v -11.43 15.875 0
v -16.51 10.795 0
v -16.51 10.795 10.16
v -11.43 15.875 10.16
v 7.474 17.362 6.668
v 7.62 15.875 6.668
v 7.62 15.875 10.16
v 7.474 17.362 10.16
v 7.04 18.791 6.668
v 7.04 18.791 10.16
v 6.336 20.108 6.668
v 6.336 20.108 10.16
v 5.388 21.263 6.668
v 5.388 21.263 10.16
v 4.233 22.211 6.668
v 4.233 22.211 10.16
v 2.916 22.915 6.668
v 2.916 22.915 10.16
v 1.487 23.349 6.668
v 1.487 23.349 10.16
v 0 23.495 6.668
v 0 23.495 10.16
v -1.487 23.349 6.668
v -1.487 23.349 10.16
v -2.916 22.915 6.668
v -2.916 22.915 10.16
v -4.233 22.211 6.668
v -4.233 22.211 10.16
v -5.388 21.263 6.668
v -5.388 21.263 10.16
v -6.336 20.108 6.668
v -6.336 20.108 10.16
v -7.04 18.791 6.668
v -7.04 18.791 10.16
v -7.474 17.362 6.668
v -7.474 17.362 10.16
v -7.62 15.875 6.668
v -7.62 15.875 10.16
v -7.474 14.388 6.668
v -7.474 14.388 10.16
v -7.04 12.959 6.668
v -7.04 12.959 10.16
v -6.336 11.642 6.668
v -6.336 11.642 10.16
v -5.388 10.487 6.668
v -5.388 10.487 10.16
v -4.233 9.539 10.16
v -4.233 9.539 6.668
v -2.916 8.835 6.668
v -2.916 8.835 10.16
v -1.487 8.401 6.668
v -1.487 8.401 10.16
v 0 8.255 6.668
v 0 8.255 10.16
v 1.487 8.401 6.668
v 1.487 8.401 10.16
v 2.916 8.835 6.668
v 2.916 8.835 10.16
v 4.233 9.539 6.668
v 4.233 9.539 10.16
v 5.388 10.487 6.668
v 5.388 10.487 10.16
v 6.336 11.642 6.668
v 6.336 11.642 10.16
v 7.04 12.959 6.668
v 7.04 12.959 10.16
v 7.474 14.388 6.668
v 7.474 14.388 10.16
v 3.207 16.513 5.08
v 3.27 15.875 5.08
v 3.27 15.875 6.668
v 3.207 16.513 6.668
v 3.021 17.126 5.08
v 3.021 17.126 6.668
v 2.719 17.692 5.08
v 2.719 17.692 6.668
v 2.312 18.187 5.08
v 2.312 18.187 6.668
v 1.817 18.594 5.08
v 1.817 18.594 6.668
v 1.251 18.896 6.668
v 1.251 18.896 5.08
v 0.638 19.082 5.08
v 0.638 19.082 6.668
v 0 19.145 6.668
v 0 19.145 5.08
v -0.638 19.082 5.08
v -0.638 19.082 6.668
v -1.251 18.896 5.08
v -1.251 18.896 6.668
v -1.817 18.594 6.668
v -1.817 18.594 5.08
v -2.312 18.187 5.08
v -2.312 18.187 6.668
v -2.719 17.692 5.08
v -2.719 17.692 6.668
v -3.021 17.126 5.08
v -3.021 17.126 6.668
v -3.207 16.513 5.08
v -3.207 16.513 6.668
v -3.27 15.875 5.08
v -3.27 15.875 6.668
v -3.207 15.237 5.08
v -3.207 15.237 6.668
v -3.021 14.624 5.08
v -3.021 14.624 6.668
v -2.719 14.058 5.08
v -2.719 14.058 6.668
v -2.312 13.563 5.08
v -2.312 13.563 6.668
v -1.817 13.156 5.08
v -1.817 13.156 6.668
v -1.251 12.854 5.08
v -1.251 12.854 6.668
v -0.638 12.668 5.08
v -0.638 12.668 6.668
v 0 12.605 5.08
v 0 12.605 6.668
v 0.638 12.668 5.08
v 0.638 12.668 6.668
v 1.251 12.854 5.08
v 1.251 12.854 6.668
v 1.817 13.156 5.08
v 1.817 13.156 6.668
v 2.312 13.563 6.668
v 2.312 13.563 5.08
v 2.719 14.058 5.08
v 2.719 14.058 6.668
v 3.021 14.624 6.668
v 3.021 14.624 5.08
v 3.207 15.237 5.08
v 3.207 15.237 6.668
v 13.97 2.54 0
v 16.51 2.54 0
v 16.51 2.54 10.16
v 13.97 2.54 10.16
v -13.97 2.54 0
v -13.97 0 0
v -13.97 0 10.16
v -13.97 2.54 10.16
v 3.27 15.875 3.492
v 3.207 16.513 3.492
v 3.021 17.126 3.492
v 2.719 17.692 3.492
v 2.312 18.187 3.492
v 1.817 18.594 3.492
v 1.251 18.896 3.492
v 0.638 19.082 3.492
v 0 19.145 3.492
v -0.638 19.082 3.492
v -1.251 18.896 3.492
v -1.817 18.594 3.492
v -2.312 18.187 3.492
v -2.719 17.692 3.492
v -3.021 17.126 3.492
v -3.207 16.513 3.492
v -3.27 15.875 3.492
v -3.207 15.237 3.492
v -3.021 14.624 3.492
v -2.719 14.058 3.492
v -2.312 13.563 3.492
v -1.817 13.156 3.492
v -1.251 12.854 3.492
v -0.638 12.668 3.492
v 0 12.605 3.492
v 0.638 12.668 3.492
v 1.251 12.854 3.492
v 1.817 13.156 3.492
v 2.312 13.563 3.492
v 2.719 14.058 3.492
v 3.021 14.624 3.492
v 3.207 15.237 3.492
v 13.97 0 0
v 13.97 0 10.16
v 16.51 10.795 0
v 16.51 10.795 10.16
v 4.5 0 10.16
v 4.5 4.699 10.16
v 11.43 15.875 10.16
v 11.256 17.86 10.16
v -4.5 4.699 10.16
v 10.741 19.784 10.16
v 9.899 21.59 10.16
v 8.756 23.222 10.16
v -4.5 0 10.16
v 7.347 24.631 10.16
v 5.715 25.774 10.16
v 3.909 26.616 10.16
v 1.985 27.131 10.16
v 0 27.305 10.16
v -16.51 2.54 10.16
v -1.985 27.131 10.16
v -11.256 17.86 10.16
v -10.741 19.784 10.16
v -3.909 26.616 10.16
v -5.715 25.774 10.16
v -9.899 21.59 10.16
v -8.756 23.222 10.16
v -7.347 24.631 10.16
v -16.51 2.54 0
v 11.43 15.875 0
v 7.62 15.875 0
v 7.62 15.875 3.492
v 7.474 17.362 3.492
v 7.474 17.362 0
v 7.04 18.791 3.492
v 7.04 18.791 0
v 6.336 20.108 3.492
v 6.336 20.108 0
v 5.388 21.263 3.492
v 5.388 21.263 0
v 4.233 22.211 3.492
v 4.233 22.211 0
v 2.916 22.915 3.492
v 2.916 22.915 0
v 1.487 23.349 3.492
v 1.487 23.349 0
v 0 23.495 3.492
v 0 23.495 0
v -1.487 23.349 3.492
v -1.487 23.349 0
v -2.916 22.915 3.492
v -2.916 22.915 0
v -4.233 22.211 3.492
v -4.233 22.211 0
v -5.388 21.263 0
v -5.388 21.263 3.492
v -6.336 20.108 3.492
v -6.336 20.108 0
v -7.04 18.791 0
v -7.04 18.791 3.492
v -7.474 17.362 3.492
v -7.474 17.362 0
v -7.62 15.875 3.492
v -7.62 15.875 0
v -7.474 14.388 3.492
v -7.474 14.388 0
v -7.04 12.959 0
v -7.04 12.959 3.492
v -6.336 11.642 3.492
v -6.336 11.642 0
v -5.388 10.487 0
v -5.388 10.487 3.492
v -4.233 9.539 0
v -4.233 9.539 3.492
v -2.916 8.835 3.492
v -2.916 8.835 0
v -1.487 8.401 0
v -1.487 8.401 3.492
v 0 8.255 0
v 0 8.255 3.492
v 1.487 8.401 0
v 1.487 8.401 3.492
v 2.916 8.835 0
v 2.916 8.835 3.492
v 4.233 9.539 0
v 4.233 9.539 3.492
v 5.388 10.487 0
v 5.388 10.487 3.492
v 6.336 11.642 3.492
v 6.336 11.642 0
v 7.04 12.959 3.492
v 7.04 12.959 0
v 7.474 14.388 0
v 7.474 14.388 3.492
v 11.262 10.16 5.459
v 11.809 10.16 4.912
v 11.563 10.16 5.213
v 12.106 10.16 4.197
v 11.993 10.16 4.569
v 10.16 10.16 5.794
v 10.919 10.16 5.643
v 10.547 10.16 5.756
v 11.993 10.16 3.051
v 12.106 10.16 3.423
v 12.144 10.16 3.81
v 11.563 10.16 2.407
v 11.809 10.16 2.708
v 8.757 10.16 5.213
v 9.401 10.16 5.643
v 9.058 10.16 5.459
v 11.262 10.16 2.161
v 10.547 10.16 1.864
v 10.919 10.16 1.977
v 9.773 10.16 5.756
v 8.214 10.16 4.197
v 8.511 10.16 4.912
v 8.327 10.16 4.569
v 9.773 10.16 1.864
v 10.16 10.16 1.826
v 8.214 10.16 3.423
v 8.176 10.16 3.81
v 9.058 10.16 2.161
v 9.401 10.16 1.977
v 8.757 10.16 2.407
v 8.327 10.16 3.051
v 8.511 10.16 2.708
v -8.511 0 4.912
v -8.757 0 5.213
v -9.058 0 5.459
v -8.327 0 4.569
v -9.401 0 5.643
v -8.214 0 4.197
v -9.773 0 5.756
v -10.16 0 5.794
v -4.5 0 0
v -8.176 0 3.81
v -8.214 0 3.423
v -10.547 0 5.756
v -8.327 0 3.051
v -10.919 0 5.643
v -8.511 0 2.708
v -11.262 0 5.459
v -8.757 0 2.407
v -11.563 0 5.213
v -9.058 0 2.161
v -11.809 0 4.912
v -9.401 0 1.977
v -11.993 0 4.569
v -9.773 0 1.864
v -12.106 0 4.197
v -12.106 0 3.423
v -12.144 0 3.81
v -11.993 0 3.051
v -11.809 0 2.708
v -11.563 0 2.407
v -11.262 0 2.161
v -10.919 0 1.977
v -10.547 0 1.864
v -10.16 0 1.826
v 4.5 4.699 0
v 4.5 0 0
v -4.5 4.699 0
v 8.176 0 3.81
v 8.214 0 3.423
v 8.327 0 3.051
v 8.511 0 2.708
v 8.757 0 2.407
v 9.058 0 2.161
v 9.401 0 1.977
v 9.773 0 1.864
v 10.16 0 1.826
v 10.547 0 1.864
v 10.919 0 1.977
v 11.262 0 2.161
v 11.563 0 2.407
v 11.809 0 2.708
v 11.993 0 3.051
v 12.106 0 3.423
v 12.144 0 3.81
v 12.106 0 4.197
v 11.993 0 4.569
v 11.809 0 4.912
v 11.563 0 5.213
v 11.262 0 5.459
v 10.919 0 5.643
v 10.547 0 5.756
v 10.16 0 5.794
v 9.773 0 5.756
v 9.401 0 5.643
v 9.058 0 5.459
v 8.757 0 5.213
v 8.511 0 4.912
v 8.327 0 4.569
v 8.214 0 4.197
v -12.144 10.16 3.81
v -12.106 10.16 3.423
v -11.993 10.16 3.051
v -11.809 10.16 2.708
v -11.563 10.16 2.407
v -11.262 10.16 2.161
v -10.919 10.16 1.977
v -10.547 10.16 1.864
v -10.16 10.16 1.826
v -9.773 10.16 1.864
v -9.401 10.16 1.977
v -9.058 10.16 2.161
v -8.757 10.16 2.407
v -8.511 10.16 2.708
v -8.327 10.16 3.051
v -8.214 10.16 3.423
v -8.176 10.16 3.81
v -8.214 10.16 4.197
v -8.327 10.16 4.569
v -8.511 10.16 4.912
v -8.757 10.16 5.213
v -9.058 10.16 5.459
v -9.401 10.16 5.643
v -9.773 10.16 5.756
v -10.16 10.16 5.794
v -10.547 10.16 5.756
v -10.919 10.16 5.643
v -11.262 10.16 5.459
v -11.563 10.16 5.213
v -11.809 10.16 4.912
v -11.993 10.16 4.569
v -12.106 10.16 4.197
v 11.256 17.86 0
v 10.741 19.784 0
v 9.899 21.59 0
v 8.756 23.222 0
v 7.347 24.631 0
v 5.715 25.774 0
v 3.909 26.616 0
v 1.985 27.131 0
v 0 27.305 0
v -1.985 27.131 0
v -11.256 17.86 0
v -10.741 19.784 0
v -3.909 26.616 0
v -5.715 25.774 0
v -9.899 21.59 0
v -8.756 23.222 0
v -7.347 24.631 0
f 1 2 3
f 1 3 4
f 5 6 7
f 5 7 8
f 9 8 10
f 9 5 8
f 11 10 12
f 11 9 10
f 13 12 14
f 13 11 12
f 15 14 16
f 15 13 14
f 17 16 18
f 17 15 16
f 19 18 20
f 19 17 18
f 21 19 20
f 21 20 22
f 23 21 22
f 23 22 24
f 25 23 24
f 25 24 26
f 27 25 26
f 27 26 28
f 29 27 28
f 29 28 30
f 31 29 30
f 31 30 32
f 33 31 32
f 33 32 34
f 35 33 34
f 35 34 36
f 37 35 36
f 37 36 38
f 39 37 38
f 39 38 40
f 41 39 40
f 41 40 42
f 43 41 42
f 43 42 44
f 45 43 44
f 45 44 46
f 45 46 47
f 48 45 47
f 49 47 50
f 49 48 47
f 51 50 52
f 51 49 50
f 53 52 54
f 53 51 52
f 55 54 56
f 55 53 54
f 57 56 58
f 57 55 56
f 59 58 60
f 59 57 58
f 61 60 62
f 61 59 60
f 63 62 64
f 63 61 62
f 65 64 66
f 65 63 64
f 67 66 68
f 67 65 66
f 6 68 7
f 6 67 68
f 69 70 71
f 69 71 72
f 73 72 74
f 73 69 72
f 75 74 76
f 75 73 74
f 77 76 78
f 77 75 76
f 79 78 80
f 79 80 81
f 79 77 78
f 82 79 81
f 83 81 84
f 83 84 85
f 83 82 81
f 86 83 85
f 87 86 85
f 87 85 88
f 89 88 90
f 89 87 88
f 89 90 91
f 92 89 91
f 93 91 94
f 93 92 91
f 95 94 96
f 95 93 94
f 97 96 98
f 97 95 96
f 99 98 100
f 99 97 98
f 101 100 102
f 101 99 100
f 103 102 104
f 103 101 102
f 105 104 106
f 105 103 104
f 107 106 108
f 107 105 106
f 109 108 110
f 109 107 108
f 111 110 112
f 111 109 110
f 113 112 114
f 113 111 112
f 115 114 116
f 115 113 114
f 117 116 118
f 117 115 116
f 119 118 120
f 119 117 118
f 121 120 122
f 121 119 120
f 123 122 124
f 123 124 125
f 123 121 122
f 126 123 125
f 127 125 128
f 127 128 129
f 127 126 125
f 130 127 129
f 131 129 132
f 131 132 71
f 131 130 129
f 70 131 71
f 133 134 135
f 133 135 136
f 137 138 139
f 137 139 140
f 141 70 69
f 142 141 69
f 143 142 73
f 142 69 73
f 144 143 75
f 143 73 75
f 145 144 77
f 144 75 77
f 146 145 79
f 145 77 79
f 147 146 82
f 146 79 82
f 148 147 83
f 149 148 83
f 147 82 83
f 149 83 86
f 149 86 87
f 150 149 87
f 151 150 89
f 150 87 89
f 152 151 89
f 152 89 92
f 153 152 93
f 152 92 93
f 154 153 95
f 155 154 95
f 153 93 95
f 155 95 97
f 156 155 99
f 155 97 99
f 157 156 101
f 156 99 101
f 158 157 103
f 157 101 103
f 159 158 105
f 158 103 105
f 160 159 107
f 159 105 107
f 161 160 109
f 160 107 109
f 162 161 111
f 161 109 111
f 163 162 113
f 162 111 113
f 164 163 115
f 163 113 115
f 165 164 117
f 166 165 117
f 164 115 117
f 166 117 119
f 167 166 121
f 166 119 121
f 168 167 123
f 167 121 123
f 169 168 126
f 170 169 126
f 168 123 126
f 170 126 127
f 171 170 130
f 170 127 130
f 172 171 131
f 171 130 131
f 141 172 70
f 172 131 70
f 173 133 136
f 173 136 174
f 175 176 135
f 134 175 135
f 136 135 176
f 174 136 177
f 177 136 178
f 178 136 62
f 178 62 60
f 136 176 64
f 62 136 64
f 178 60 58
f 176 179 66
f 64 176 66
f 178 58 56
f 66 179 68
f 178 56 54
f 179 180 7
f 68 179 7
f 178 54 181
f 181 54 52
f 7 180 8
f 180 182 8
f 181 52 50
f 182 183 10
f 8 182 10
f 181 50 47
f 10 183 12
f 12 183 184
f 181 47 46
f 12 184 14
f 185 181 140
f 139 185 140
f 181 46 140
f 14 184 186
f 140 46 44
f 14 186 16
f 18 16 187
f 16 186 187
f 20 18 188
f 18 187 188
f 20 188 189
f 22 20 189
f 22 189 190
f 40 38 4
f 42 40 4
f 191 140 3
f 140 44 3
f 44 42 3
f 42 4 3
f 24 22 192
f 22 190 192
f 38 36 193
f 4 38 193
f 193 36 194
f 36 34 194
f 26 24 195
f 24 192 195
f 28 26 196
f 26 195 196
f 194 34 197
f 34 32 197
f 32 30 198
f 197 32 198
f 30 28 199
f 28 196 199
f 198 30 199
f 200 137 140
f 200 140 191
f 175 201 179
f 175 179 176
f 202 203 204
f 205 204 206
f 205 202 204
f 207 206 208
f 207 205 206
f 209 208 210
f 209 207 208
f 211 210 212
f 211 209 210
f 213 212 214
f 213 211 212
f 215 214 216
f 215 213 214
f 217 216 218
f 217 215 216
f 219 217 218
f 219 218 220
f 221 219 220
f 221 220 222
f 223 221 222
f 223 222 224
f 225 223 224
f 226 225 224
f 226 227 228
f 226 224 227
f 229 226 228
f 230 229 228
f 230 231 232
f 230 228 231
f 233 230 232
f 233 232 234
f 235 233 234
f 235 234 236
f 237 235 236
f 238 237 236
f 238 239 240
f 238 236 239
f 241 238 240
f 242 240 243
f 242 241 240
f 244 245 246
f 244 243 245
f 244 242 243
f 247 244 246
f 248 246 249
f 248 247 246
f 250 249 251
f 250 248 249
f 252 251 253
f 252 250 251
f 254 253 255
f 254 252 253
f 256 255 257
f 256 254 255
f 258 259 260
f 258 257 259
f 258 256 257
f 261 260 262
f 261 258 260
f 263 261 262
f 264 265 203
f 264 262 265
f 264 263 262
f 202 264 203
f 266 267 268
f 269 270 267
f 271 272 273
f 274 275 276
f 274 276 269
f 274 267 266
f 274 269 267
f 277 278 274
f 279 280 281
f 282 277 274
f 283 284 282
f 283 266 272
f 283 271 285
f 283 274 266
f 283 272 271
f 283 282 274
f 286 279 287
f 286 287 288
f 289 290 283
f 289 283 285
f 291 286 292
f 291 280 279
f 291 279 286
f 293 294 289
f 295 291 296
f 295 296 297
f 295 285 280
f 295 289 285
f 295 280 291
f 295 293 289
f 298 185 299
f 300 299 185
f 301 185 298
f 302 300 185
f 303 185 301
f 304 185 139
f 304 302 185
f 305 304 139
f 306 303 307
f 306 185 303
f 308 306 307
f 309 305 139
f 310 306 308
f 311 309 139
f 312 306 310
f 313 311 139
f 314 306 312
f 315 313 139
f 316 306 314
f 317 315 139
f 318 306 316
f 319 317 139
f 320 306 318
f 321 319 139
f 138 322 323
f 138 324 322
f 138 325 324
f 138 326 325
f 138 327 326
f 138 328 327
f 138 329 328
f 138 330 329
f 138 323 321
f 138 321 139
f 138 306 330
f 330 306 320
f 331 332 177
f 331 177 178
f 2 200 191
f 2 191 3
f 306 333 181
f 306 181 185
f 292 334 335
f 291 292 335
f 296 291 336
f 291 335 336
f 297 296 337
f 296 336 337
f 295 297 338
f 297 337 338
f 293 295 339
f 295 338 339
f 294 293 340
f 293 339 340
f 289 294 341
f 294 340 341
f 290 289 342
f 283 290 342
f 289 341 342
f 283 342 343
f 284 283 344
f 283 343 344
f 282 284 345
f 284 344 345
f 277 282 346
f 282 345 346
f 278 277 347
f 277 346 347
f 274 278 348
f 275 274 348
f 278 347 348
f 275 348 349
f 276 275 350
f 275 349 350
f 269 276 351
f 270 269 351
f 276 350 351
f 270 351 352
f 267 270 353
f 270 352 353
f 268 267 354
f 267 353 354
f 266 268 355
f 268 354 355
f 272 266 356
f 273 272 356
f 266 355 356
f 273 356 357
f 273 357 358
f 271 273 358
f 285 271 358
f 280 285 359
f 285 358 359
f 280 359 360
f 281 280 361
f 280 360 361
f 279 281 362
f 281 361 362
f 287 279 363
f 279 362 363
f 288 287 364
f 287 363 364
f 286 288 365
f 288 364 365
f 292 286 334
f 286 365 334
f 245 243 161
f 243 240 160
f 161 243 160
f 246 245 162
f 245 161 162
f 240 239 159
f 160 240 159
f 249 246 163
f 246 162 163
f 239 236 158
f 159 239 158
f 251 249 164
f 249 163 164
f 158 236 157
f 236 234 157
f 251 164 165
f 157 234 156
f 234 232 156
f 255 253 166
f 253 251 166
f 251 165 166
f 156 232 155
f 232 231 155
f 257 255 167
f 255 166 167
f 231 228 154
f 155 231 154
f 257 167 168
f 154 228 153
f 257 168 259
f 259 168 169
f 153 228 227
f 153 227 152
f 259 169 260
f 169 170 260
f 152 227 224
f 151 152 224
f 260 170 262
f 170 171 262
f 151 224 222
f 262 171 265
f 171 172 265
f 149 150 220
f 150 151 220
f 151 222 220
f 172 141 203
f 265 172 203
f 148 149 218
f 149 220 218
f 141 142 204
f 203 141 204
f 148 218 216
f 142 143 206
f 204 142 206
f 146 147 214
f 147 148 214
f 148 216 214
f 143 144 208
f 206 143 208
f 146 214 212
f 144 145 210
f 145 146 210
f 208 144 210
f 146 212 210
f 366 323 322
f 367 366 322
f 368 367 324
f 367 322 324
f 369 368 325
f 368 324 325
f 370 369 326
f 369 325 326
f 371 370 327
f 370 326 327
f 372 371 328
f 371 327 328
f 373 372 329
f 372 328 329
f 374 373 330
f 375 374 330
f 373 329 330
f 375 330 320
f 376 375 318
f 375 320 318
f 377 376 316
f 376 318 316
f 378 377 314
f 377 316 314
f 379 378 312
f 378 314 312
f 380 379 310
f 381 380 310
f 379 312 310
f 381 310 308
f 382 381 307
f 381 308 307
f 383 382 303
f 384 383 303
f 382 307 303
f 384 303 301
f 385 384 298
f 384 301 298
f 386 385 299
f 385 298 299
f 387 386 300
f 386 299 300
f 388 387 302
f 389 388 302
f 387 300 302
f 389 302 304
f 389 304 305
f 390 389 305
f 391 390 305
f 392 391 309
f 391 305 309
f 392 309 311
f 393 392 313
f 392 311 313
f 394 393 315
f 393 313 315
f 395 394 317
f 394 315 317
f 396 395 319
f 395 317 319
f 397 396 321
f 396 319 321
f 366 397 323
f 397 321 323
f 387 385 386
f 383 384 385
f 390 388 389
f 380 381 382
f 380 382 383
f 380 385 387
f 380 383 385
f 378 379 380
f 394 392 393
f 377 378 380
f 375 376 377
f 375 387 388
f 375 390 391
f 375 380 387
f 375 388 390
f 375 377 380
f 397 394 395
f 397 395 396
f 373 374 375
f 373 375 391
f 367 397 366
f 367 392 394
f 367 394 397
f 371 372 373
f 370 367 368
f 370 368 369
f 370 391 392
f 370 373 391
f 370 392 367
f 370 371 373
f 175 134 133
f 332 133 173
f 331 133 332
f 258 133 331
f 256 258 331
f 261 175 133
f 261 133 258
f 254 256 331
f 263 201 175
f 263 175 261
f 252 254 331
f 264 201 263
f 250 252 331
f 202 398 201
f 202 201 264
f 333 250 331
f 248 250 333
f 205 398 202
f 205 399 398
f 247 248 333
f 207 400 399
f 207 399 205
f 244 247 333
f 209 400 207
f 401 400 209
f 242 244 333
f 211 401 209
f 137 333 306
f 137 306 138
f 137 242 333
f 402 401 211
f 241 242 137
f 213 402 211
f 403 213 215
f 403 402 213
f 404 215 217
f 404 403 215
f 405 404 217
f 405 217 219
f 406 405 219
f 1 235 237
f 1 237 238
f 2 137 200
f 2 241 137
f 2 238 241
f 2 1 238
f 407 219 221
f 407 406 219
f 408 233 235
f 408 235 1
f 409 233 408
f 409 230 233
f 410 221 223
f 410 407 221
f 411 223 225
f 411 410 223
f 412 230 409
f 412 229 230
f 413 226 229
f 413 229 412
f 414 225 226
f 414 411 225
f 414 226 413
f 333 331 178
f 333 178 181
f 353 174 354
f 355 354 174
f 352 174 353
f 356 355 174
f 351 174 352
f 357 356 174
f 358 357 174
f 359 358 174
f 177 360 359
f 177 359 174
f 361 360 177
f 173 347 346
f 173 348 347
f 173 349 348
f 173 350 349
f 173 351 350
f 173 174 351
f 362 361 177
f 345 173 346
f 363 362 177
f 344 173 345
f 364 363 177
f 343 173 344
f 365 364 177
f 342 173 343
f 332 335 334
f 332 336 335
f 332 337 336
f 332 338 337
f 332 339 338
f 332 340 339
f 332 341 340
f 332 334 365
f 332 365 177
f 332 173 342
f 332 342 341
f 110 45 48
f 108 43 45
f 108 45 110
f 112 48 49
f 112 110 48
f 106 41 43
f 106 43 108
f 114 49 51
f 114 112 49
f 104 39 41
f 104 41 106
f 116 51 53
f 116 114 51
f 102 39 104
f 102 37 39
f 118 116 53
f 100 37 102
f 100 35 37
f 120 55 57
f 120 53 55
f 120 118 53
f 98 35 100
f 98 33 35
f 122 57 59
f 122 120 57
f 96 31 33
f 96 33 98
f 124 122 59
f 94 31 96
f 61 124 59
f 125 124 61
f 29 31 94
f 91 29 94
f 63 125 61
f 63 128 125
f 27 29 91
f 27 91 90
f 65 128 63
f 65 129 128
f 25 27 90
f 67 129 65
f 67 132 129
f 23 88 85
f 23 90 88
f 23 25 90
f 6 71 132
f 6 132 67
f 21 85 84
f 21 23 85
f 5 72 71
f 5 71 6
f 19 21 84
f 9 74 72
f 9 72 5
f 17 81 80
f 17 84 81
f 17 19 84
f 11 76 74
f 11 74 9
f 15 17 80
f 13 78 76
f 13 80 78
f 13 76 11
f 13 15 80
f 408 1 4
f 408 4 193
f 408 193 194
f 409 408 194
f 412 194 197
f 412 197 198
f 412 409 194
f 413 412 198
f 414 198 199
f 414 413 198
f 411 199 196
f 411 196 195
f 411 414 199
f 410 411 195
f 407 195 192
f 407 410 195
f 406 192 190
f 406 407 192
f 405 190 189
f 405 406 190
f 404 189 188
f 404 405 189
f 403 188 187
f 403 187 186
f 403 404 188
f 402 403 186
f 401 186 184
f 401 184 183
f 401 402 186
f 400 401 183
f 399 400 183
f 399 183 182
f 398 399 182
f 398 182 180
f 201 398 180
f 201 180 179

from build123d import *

# Parameters (mm, degrees)
SKETCH1_R                = 7.62
BOSS_EXTRUDE1_DEPTH      = 10.16
SKETCH3_R                = 8.7376
SKETCH3_R_2              = 3.27025
BOSS_EXTRUDE2_DEPTH      = 1.5875
BOSS_EXTRUDE2_DEPTH_BACK = 1.5875
SKETCH4_R                = 1.98374
CUT_EXTRUDE1_DEPTH       = 10.16


with BuildPart() as part:
    # Sketch1 → Boss-Extrude1 (new body)
    with BuildSketch(Plane.XY):
        with BuildLine():
            Line((4.5, 4.699), (-4.5, 4.699))
            Line((-4.5, 4.699), (-4.5, 0))
            Line((-4.5, 0), (-13.97, 0))
            Line((-13.97, 0), (-13.97, 2.54))
            Line((-13.97, 2.54), (-16.51, 2.54))
            Line((-16.51, 2.54), (-16.51, 10.795))
            Line((-16.51, 10.795), (-11.43, 15.875))
            ThreePointArc((-11.43, 15.875), (0, 27.305), (11.43, 15.875))
            Line((11.43, 15.875), (16.51, 10.795))
            Line((16.51, 10.795), (16.51, 2.54))
            Line((16.51, 2.54), (13.97, 2.54))
            Line((13.97, 2.54), (13.97, 0))
            Line((13.97, 0), (4.5, 0))
            Line((4.5, 0), (4.5, 4.699))
        make_face()
        with Locations((0, 15.875)):
            Circle(SKETCH1_R, mode=Mode.SUBTRACT)
    extrude(amount=BOSS_EXTRUDE1_DEPTH)

    # Sketch3 → Boss-Extrude2 (add, two sides)
    with BuildSketch(Plane.XY.offset(5.08)) as boss_extrude2_sk:
        with Locations((0, 15.875)):
            Circle(SKETCH3_R)
        with Locations((0, 15.875)):
            Circle(SKETCH3_R_2, mode=Mode.SUBTRACT)
    extrude(amount=BOSS_EXTRUDE2_DEPTH)
    extrude(boss_extrude2_sk.sketch, amount=-BOSS_EXTRUDE2_DEPTH_BACK)

    # Sketch4 → Cut-Extrude1 (cut)
    with BuildSketch(Plane(origin=(0, 0, 0), x_dir=(-1, 0, 0), z_dir=(0, -1, 0))):
        with Locations((-10.16, -3.81)):
            Circle(SKETCH4_R)
        with Locations((10.16, -3.81)):
            Circle(SKETCH4_R)
    extrude(amount=-CUT_EXTRUDE1_DEPTH, mode=Mode.SUBTRACT)


solid = part.part
